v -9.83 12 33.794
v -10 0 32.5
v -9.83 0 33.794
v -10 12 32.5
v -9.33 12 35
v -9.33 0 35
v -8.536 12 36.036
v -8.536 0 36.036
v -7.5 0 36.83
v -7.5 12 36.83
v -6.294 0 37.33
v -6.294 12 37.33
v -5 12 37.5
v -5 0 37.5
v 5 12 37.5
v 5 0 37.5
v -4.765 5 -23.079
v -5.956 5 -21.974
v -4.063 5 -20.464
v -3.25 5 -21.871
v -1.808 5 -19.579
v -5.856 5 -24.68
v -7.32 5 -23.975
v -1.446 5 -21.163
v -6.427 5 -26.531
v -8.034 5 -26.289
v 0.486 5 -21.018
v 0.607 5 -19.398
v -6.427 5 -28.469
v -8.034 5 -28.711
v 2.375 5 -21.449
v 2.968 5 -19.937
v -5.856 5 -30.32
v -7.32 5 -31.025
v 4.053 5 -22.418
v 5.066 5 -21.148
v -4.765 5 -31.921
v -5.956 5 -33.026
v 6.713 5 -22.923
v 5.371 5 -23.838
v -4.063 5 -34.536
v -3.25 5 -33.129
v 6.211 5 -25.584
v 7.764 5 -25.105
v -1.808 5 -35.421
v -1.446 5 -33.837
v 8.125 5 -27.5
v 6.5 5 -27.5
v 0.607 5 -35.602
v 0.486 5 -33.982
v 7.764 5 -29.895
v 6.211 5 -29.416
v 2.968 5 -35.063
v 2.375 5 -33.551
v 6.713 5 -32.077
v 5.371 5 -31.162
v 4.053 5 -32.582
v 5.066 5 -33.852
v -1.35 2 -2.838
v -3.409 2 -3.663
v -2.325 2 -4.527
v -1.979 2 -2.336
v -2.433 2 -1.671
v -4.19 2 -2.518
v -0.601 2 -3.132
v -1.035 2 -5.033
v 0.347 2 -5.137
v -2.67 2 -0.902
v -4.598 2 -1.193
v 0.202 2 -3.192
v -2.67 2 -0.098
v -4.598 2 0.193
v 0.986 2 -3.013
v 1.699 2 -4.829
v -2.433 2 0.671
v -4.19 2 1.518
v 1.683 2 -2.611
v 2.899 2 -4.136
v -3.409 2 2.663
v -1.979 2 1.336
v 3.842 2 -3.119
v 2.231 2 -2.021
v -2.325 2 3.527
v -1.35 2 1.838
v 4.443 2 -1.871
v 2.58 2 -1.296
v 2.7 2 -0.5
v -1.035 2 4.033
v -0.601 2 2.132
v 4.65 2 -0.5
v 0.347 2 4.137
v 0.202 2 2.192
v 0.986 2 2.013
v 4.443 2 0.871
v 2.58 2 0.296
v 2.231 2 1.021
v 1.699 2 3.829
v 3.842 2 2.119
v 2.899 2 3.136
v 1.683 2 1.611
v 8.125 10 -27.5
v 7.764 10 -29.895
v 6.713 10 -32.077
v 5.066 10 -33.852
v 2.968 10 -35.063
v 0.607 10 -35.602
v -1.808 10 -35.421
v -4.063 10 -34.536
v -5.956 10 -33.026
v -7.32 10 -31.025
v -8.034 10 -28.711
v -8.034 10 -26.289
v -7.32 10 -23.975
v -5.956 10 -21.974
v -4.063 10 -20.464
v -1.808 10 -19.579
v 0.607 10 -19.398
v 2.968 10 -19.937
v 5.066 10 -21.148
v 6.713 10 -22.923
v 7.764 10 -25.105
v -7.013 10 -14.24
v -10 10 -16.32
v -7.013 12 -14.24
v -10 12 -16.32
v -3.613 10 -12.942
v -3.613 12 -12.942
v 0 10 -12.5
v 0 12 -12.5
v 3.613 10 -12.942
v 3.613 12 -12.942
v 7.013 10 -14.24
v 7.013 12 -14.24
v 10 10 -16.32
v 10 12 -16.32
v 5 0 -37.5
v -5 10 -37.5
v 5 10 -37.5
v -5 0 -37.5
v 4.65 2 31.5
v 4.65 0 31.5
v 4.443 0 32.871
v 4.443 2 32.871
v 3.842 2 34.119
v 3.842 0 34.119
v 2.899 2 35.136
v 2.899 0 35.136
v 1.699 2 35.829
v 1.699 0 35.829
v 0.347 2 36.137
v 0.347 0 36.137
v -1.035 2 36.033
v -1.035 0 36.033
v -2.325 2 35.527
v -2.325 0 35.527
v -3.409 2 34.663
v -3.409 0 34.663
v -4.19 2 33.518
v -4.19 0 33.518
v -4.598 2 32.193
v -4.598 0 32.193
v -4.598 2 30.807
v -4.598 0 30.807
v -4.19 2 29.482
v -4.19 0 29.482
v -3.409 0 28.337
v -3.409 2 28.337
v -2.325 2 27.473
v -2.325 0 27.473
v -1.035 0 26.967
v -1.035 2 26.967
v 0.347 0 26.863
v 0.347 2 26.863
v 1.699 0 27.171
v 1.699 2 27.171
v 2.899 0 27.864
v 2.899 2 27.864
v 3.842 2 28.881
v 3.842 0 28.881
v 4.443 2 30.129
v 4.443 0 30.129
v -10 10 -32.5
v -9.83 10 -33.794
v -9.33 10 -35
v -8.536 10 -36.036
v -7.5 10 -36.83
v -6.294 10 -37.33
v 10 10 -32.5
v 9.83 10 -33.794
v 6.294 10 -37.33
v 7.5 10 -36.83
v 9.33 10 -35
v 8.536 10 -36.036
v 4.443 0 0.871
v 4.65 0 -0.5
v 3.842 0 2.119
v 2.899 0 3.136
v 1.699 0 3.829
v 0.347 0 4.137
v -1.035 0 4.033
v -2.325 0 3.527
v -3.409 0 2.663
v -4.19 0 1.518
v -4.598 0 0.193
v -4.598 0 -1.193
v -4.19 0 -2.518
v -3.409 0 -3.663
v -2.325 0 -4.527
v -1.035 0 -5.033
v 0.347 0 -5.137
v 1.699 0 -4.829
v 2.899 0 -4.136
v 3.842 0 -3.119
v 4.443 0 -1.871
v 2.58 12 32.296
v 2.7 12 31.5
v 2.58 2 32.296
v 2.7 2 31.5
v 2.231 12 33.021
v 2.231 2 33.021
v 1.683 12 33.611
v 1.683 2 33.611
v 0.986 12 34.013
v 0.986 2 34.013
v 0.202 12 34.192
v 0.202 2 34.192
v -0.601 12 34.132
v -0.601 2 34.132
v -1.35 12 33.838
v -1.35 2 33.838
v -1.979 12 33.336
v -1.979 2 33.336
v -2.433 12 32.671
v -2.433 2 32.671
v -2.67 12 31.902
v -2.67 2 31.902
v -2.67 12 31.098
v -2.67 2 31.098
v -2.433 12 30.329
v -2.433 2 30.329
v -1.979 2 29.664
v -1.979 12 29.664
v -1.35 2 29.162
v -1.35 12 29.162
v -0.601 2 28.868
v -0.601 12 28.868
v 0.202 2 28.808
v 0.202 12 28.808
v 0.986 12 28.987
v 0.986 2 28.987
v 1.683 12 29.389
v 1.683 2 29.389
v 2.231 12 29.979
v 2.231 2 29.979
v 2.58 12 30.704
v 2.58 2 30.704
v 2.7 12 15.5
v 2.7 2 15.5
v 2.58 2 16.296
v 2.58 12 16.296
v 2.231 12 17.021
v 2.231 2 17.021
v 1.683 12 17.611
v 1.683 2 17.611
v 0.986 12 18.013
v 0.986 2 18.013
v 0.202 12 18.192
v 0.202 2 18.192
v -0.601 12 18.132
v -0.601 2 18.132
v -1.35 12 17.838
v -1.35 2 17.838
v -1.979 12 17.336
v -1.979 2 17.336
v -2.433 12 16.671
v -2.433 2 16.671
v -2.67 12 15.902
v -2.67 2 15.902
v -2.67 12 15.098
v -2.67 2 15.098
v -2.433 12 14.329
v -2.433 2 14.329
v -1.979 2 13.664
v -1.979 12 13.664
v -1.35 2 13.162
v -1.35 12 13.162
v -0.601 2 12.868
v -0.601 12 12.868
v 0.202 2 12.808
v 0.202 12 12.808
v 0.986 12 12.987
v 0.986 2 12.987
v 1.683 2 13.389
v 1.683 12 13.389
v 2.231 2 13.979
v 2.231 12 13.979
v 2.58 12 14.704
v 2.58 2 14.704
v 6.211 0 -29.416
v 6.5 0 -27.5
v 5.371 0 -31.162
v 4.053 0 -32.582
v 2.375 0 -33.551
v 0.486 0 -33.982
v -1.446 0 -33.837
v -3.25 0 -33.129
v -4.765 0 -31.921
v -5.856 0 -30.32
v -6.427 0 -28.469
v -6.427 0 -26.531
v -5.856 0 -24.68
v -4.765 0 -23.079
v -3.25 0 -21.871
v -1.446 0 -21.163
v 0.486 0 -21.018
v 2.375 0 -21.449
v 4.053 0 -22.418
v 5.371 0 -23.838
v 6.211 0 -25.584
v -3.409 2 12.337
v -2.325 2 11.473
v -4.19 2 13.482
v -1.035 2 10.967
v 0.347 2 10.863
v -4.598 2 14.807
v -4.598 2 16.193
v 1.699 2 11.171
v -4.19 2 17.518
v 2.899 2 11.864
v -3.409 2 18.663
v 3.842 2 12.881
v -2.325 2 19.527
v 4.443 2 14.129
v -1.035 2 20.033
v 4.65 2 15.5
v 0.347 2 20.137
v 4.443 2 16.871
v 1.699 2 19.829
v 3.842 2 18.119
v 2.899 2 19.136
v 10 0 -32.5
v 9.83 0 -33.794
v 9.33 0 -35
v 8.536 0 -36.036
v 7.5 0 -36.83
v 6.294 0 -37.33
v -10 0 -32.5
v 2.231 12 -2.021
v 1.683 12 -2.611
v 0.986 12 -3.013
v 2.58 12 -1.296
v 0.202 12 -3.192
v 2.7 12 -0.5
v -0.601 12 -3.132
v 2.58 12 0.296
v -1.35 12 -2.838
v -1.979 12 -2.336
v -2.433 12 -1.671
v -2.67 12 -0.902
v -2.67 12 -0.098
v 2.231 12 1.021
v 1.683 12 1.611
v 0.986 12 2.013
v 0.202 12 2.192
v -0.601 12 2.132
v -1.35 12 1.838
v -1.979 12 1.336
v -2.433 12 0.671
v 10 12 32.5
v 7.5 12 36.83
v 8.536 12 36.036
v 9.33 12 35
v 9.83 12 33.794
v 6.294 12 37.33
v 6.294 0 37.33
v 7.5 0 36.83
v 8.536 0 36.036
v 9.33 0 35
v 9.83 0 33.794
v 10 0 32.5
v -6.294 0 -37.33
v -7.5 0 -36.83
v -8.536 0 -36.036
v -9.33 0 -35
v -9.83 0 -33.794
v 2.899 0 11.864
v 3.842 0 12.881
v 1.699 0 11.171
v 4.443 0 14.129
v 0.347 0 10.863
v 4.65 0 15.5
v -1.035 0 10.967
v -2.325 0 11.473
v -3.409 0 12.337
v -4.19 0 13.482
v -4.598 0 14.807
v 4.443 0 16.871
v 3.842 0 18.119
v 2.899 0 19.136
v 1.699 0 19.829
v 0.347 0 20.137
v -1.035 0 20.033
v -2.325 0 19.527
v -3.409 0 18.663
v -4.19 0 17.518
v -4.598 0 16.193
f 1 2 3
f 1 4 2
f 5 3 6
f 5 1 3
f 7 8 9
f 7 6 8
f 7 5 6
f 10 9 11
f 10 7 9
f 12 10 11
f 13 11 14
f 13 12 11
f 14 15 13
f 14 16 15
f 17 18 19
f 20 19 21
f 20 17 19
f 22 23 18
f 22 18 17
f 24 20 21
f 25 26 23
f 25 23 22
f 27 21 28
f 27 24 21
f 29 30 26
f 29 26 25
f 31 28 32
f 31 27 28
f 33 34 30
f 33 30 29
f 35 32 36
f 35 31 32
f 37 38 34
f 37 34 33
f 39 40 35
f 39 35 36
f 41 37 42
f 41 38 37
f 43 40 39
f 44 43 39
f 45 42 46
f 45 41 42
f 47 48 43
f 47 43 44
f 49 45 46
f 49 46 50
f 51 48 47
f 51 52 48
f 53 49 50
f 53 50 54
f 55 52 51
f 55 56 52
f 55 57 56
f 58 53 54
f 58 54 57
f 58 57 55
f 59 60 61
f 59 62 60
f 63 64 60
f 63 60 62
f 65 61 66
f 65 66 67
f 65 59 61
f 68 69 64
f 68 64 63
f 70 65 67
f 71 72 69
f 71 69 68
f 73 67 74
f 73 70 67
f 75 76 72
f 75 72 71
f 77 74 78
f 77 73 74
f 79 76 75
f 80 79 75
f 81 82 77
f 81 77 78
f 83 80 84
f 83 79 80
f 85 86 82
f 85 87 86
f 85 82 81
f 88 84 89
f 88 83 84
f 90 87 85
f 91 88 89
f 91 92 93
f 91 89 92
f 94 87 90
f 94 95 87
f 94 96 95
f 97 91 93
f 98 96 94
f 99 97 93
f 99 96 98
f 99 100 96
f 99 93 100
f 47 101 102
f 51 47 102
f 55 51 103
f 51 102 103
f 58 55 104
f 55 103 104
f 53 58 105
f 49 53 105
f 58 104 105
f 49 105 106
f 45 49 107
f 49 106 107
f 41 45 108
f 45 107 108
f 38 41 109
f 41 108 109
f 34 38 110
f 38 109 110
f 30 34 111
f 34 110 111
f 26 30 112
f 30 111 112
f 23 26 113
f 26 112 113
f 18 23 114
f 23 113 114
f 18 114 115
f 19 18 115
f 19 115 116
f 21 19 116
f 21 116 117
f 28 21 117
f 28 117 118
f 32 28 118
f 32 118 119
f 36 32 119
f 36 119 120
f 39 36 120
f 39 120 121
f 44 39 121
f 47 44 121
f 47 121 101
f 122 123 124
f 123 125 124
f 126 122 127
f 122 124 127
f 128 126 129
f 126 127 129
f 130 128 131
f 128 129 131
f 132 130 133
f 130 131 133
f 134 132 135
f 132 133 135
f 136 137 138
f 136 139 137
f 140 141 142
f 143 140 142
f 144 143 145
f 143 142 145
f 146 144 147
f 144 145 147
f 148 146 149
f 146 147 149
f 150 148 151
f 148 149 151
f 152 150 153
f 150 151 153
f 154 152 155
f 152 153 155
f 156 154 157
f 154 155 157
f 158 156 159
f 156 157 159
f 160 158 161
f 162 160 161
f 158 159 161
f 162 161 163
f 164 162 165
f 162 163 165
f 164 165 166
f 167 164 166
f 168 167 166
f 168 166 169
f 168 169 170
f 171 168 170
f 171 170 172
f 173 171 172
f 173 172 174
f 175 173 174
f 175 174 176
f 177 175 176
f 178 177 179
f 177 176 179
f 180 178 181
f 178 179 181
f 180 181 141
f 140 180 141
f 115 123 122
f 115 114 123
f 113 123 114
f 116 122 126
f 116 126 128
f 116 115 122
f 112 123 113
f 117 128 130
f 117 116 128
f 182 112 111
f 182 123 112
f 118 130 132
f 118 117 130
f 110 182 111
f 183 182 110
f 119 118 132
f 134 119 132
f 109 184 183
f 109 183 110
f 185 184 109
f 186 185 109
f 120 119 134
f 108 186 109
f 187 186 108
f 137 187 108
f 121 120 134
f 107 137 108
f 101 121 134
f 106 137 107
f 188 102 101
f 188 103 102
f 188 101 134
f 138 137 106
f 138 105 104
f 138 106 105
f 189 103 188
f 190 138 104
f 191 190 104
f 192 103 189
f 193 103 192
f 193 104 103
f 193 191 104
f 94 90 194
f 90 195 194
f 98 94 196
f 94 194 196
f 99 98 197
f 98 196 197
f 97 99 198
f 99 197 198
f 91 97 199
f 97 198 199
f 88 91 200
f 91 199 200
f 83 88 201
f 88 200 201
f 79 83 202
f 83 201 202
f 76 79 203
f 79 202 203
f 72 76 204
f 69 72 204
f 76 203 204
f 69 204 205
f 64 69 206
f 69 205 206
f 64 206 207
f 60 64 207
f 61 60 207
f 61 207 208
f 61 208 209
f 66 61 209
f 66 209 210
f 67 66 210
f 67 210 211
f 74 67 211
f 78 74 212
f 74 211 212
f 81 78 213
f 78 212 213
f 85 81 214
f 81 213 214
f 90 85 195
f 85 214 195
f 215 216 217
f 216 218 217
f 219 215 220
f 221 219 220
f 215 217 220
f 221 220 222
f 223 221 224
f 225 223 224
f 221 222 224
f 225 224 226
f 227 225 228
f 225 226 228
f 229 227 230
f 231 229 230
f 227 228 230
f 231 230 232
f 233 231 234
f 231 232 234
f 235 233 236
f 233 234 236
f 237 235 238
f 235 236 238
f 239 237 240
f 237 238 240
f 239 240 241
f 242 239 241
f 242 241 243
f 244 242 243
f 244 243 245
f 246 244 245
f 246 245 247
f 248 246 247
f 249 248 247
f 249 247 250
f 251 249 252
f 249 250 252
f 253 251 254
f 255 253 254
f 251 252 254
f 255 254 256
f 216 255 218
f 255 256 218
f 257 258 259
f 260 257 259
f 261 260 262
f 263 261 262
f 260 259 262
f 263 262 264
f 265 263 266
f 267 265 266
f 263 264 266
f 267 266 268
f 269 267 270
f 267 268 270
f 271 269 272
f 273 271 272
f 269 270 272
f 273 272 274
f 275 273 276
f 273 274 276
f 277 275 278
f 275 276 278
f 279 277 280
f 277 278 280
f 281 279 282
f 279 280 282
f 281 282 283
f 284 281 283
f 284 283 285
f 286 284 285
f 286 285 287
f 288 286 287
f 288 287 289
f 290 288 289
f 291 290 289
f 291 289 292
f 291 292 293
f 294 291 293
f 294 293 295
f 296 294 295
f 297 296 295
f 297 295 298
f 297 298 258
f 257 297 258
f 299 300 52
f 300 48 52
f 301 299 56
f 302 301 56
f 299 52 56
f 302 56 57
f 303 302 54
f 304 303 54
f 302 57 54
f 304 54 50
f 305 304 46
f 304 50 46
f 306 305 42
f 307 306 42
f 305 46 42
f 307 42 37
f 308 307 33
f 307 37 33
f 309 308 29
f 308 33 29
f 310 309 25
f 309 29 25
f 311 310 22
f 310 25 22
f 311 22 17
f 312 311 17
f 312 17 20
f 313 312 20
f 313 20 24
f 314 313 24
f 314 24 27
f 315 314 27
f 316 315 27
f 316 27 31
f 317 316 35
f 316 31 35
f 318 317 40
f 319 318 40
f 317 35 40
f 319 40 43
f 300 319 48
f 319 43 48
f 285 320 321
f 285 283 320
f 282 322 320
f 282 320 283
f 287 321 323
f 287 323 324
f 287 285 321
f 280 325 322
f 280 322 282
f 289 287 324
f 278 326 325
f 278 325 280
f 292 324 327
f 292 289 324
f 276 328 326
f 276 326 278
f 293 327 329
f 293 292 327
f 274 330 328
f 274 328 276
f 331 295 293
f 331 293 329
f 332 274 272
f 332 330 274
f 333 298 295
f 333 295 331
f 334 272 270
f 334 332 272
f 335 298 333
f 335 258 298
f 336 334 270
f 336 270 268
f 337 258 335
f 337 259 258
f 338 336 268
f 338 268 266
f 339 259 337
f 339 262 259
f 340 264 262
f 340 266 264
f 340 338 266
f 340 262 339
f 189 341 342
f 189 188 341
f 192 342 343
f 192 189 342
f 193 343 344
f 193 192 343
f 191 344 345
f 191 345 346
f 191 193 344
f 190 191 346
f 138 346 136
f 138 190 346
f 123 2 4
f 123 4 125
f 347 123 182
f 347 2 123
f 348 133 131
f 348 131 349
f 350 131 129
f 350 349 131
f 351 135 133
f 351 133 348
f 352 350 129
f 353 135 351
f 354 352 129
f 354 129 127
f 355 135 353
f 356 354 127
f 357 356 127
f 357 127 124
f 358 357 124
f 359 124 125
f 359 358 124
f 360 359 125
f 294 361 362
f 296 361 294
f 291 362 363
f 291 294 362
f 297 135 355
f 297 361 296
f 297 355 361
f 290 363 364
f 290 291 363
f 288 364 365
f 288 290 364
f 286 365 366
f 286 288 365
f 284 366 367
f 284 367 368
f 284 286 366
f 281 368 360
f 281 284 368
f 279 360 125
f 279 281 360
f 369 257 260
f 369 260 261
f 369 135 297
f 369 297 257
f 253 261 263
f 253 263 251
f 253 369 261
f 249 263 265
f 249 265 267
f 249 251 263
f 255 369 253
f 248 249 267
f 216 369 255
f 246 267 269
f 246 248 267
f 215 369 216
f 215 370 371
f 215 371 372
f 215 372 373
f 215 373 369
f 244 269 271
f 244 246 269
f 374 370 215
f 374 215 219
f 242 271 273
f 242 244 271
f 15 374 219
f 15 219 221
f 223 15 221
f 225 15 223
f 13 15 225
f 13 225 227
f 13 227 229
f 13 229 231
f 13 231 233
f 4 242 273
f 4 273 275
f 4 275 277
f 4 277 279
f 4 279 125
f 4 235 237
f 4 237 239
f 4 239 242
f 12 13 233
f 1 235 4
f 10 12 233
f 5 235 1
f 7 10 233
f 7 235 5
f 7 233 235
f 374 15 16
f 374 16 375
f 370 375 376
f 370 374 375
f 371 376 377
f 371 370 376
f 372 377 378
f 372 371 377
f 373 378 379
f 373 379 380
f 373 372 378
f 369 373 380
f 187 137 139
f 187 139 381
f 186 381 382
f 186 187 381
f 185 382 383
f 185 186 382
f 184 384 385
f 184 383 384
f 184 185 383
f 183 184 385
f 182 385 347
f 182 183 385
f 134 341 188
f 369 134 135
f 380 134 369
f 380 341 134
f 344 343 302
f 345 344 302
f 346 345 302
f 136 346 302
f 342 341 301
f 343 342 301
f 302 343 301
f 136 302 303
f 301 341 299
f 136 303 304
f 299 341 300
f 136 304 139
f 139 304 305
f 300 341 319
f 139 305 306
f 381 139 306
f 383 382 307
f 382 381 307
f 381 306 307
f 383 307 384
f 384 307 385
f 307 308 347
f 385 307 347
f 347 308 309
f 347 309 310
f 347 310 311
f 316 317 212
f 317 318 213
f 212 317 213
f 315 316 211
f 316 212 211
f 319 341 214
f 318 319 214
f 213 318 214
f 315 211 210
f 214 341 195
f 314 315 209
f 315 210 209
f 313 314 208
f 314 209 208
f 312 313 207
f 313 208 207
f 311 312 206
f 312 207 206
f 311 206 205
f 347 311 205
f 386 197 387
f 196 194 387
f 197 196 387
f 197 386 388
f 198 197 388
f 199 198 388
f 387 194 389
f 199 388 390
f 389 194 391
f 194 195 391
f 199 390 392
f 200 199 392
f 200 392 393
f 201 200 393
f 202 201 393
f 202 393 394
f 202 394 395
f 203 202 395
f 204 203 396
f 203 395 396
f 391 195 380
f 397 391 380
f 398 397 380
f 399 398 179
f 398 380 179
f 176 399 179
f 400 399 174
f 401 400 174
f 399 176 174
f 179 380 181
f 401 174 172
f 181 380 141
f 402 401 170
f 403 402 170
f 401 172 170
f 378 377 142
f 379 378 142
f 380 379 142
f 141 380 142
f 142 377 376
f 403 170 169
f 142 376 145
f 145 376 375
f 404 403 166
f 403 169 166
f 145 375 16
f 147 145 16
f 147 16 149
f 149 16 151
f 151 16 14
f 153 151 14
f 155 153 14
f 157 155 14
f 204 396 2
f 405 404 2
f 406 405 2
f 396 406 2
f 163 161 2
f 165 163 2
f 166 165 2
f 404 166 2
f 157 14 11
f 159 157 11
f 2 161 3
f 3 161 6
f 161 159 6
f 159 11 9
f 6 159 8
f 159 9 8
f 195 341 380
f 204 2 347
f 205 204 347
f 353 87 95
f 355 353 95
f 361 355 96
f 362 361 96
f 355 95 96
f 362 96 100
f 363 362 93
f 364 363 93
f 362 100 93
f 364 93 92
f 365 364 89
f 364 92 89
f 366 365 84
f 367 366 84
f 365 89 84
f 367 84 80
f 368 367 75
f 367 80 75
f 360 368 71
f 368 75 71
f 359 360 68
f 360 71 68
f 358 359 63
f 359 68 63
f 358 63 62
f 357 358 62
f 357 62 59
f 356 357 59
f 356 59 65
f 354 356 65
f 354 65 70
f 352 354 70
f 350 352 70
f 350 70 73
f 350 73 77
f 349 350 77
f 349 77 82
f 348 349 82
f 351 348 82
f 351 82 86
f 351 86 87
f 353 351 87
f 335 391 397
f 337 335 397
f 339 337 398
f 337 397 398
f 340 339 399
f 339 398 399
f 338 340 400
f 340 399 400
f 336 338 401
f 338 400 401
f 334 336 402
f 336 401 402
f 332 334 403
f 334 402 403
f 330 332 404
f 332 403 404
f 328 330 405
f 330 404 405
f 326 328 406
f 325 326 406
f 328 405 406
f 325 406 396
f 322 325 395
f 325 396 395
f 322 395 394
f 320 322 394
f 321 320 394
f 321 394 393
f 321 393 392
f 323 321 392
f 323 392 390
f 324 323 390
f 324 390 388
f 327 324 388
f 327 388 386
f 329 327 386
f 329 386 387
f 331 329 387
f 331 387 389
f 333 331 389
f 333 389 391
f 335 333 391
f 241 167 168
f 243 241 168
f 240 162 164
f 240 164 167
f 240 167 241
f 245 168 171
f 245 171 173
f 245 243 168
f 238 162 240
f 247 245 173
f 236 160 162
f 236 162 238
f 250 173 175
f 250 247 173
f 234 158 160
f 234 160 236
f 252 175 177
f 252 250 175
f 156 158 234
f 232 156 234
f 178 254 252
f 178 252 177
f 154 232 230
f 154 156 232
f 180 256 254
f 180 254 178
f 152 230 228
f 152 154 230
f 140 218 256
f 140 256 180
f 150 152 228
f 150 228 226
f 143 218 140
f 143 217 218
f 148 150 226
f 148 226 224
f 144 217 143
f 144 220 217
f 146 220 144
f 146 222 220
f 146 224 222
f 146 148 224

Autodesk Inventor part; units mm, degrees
ref_plane "YZ Plane" through (0, 0, 0) normal (1, 0, 0) x (0, 1, 0)
ref_plane "XZ Plane" through (0, 0, 0) normal (0, 1, 0) x (-1, 0, 0)
ref_plane "XY Plane" through (0, 0, 0) normal (0, 0, 1) x (1, 0, 0)
sketch "Boceto1" plane through (0, 0, 0) normal (0, 1, 0) x (-1, 0, 0)
  line L0 (-10, 37.5) -> (10, 37.5)
  line L1 (10, 37.5) -> (10, -37.5)
  line L2 (10, -37.5) -> (-10, -37.5)
  line L3 (-10, -37.5) -> (-10, 37.5)
  line L4 (-10, 37.5) -> (10, -37.5) construction
  line L5 (10, 37.5) -> (-10, -37.5) construction
  circle A0 centre (0, -27.5) radius 8.125
  point P0 (0, 0)
  point P1 (5.4787, -34.25)
  point P2 (-5.4787, -34.25)
  dimension "d0" = 20
  dimension "d23" = 65
  dimension "d24" = 10
  dimension "d25" = 16.25
extrude "Extrusión1" add sketch "Boceto1" along normal blind 12 contours L0 L1 L2 L3 | A0
sketch "Boceto5" plane through (0, 12, 0) normal (0, 1, 0) x (1, 0, 0)
  circle A0 centre (0, 27.5) radius 8.125
  line L0 (10, 37.5) -> (-10, 37.5)
  line L1 (-10, -37.5) -> (10, -37.5)
  point P0 (0, 0)
  dimension "d26" = 16.25
  dimension "d36" = 65
extrude "Extrusión5" cut sketch "Boceto5" against normal blind 7
sketch "Boceto6" plane through (0, 5, -27.5) normal (0, 1, 0) x (1, 0, 0)
  circle A0 centre (0, 0) radius 6.5
  point P0 (0, -27.5)
  dimension "d30" = 13
extrude "Extrusión6" cut sketch "Boceto6" against normal through all
sketch "Boceto7" plane through (0, 12, 0) normal (0, 1, 0) x (1, 0, 0)
  circle A0 centre (0, 27.5) radius 8.125
  circle A1 centre (0, 27.5) radius 15
  point P0 (0, 0)
  dimension "d33" = 30
extrude "Extrusión7" cut sketch "Boceto7" against normal blind 2
fillet "Empalme5" radius 5 2 edges at (-10, 6, 37.5) (10, 6, 37.5)
fillet "Empalme6" radius 5 2 edges at (10, 5, -37.5) (-10, 5, -37.5)
sketch "Boceto8" plane through (0, 0, 0) normal (0, -1, 0) x (1, 0, 0)
  circle A0 centre (0, 31.5) radius 2.7
  circle A1 centre (0, 15.5) radius 2.7
  line L0 (-5, 37.5) -> (5, 37.5)
  circle A2 centre (0, -0.5) radius 2.7
  point P0 (0, 0)
  dimension "d39" = 5.4
  dimension "d40" = 6
  dimension "d41" = 16
  dimension "d47" = 16
extrude "Extrusión8" cut sketch "Boceto8" against normal through all
sketch "Boceto9" plane through (0, 0, 0) normal (0, -1, 0) x (1, 0, 0)
  circle A0 centre (0, 31.5) radius 2.7
  circle A1 centre (0, 31.5) radius 4.65
  circle A2 centre (0, 15.5) radius 2.7
  circle A3 centre (0, 15.5) radius 4.65
  circle A4 centre (0, -0.5) radius 2.7
  circle A5 centre (0, -0.5) radius 4.65
  point P0 (0, 0)
  dimension "d44" = 9.3
extrude "Extrusión9" cut sketch "Boceto9" against normal blind 2 contours A0 | A1 | A2 | A3 | A4 | A5
sketch "Boceto2" plane through (0, 12, 0) normal (0, 1, 0) x (1, 0, 0)
  line L0 (10, 37.5) -> (-10, 37.5)
  line L1 (-10, 37.5) -> (5, 37.5)
  line L2 (5, 37.5) -> (5, 77.5)
  line L3 (5, 77.5) -> (-5, 77.5)
  line L4 (-5, 77.5) -> (-5, 37.5)
  circle A0 centre (0, 70) radius 2.7
  line L5 (10, -37.5) -> (10, 37.5)
  line L6 (10, 37.5) -> (-10, 37.5)
  point P0 (0, 0)
  point P1 (5, 20)
  point P2 (-5, 20)
  dimension "d4" = 5.4
  dimension "d5" = 7.5
  dimension "d19" = 40
  dimension "d20" = 5
  dimension "d21" = 5
  dimension "d22" = 5
sketch "Boceto3" plane through (0, 10.5, 0) normal (0, -1, 0) x (1, 0, 0)
  circle A0 centre (0, -52.5) radius 2.7
  circle A1 centre (0, -52.5) radius 5
  line L0 (5, -60) -> (5, -20)
  point P0 (0, 0)
sketch "Boceto4" plane through (0, 0, 0) normal (0, -1, 0) x (1, 0, 0)
  circle A0 centre (0, -8) radius 2.7
  circle A1 centre (0, 8) radius 2.7
  point P0 (0, 0)
  dimension "d13" = 5.4
  dimension "d14" = 8
  dimension "d15" = 8
properties part number "top support"
